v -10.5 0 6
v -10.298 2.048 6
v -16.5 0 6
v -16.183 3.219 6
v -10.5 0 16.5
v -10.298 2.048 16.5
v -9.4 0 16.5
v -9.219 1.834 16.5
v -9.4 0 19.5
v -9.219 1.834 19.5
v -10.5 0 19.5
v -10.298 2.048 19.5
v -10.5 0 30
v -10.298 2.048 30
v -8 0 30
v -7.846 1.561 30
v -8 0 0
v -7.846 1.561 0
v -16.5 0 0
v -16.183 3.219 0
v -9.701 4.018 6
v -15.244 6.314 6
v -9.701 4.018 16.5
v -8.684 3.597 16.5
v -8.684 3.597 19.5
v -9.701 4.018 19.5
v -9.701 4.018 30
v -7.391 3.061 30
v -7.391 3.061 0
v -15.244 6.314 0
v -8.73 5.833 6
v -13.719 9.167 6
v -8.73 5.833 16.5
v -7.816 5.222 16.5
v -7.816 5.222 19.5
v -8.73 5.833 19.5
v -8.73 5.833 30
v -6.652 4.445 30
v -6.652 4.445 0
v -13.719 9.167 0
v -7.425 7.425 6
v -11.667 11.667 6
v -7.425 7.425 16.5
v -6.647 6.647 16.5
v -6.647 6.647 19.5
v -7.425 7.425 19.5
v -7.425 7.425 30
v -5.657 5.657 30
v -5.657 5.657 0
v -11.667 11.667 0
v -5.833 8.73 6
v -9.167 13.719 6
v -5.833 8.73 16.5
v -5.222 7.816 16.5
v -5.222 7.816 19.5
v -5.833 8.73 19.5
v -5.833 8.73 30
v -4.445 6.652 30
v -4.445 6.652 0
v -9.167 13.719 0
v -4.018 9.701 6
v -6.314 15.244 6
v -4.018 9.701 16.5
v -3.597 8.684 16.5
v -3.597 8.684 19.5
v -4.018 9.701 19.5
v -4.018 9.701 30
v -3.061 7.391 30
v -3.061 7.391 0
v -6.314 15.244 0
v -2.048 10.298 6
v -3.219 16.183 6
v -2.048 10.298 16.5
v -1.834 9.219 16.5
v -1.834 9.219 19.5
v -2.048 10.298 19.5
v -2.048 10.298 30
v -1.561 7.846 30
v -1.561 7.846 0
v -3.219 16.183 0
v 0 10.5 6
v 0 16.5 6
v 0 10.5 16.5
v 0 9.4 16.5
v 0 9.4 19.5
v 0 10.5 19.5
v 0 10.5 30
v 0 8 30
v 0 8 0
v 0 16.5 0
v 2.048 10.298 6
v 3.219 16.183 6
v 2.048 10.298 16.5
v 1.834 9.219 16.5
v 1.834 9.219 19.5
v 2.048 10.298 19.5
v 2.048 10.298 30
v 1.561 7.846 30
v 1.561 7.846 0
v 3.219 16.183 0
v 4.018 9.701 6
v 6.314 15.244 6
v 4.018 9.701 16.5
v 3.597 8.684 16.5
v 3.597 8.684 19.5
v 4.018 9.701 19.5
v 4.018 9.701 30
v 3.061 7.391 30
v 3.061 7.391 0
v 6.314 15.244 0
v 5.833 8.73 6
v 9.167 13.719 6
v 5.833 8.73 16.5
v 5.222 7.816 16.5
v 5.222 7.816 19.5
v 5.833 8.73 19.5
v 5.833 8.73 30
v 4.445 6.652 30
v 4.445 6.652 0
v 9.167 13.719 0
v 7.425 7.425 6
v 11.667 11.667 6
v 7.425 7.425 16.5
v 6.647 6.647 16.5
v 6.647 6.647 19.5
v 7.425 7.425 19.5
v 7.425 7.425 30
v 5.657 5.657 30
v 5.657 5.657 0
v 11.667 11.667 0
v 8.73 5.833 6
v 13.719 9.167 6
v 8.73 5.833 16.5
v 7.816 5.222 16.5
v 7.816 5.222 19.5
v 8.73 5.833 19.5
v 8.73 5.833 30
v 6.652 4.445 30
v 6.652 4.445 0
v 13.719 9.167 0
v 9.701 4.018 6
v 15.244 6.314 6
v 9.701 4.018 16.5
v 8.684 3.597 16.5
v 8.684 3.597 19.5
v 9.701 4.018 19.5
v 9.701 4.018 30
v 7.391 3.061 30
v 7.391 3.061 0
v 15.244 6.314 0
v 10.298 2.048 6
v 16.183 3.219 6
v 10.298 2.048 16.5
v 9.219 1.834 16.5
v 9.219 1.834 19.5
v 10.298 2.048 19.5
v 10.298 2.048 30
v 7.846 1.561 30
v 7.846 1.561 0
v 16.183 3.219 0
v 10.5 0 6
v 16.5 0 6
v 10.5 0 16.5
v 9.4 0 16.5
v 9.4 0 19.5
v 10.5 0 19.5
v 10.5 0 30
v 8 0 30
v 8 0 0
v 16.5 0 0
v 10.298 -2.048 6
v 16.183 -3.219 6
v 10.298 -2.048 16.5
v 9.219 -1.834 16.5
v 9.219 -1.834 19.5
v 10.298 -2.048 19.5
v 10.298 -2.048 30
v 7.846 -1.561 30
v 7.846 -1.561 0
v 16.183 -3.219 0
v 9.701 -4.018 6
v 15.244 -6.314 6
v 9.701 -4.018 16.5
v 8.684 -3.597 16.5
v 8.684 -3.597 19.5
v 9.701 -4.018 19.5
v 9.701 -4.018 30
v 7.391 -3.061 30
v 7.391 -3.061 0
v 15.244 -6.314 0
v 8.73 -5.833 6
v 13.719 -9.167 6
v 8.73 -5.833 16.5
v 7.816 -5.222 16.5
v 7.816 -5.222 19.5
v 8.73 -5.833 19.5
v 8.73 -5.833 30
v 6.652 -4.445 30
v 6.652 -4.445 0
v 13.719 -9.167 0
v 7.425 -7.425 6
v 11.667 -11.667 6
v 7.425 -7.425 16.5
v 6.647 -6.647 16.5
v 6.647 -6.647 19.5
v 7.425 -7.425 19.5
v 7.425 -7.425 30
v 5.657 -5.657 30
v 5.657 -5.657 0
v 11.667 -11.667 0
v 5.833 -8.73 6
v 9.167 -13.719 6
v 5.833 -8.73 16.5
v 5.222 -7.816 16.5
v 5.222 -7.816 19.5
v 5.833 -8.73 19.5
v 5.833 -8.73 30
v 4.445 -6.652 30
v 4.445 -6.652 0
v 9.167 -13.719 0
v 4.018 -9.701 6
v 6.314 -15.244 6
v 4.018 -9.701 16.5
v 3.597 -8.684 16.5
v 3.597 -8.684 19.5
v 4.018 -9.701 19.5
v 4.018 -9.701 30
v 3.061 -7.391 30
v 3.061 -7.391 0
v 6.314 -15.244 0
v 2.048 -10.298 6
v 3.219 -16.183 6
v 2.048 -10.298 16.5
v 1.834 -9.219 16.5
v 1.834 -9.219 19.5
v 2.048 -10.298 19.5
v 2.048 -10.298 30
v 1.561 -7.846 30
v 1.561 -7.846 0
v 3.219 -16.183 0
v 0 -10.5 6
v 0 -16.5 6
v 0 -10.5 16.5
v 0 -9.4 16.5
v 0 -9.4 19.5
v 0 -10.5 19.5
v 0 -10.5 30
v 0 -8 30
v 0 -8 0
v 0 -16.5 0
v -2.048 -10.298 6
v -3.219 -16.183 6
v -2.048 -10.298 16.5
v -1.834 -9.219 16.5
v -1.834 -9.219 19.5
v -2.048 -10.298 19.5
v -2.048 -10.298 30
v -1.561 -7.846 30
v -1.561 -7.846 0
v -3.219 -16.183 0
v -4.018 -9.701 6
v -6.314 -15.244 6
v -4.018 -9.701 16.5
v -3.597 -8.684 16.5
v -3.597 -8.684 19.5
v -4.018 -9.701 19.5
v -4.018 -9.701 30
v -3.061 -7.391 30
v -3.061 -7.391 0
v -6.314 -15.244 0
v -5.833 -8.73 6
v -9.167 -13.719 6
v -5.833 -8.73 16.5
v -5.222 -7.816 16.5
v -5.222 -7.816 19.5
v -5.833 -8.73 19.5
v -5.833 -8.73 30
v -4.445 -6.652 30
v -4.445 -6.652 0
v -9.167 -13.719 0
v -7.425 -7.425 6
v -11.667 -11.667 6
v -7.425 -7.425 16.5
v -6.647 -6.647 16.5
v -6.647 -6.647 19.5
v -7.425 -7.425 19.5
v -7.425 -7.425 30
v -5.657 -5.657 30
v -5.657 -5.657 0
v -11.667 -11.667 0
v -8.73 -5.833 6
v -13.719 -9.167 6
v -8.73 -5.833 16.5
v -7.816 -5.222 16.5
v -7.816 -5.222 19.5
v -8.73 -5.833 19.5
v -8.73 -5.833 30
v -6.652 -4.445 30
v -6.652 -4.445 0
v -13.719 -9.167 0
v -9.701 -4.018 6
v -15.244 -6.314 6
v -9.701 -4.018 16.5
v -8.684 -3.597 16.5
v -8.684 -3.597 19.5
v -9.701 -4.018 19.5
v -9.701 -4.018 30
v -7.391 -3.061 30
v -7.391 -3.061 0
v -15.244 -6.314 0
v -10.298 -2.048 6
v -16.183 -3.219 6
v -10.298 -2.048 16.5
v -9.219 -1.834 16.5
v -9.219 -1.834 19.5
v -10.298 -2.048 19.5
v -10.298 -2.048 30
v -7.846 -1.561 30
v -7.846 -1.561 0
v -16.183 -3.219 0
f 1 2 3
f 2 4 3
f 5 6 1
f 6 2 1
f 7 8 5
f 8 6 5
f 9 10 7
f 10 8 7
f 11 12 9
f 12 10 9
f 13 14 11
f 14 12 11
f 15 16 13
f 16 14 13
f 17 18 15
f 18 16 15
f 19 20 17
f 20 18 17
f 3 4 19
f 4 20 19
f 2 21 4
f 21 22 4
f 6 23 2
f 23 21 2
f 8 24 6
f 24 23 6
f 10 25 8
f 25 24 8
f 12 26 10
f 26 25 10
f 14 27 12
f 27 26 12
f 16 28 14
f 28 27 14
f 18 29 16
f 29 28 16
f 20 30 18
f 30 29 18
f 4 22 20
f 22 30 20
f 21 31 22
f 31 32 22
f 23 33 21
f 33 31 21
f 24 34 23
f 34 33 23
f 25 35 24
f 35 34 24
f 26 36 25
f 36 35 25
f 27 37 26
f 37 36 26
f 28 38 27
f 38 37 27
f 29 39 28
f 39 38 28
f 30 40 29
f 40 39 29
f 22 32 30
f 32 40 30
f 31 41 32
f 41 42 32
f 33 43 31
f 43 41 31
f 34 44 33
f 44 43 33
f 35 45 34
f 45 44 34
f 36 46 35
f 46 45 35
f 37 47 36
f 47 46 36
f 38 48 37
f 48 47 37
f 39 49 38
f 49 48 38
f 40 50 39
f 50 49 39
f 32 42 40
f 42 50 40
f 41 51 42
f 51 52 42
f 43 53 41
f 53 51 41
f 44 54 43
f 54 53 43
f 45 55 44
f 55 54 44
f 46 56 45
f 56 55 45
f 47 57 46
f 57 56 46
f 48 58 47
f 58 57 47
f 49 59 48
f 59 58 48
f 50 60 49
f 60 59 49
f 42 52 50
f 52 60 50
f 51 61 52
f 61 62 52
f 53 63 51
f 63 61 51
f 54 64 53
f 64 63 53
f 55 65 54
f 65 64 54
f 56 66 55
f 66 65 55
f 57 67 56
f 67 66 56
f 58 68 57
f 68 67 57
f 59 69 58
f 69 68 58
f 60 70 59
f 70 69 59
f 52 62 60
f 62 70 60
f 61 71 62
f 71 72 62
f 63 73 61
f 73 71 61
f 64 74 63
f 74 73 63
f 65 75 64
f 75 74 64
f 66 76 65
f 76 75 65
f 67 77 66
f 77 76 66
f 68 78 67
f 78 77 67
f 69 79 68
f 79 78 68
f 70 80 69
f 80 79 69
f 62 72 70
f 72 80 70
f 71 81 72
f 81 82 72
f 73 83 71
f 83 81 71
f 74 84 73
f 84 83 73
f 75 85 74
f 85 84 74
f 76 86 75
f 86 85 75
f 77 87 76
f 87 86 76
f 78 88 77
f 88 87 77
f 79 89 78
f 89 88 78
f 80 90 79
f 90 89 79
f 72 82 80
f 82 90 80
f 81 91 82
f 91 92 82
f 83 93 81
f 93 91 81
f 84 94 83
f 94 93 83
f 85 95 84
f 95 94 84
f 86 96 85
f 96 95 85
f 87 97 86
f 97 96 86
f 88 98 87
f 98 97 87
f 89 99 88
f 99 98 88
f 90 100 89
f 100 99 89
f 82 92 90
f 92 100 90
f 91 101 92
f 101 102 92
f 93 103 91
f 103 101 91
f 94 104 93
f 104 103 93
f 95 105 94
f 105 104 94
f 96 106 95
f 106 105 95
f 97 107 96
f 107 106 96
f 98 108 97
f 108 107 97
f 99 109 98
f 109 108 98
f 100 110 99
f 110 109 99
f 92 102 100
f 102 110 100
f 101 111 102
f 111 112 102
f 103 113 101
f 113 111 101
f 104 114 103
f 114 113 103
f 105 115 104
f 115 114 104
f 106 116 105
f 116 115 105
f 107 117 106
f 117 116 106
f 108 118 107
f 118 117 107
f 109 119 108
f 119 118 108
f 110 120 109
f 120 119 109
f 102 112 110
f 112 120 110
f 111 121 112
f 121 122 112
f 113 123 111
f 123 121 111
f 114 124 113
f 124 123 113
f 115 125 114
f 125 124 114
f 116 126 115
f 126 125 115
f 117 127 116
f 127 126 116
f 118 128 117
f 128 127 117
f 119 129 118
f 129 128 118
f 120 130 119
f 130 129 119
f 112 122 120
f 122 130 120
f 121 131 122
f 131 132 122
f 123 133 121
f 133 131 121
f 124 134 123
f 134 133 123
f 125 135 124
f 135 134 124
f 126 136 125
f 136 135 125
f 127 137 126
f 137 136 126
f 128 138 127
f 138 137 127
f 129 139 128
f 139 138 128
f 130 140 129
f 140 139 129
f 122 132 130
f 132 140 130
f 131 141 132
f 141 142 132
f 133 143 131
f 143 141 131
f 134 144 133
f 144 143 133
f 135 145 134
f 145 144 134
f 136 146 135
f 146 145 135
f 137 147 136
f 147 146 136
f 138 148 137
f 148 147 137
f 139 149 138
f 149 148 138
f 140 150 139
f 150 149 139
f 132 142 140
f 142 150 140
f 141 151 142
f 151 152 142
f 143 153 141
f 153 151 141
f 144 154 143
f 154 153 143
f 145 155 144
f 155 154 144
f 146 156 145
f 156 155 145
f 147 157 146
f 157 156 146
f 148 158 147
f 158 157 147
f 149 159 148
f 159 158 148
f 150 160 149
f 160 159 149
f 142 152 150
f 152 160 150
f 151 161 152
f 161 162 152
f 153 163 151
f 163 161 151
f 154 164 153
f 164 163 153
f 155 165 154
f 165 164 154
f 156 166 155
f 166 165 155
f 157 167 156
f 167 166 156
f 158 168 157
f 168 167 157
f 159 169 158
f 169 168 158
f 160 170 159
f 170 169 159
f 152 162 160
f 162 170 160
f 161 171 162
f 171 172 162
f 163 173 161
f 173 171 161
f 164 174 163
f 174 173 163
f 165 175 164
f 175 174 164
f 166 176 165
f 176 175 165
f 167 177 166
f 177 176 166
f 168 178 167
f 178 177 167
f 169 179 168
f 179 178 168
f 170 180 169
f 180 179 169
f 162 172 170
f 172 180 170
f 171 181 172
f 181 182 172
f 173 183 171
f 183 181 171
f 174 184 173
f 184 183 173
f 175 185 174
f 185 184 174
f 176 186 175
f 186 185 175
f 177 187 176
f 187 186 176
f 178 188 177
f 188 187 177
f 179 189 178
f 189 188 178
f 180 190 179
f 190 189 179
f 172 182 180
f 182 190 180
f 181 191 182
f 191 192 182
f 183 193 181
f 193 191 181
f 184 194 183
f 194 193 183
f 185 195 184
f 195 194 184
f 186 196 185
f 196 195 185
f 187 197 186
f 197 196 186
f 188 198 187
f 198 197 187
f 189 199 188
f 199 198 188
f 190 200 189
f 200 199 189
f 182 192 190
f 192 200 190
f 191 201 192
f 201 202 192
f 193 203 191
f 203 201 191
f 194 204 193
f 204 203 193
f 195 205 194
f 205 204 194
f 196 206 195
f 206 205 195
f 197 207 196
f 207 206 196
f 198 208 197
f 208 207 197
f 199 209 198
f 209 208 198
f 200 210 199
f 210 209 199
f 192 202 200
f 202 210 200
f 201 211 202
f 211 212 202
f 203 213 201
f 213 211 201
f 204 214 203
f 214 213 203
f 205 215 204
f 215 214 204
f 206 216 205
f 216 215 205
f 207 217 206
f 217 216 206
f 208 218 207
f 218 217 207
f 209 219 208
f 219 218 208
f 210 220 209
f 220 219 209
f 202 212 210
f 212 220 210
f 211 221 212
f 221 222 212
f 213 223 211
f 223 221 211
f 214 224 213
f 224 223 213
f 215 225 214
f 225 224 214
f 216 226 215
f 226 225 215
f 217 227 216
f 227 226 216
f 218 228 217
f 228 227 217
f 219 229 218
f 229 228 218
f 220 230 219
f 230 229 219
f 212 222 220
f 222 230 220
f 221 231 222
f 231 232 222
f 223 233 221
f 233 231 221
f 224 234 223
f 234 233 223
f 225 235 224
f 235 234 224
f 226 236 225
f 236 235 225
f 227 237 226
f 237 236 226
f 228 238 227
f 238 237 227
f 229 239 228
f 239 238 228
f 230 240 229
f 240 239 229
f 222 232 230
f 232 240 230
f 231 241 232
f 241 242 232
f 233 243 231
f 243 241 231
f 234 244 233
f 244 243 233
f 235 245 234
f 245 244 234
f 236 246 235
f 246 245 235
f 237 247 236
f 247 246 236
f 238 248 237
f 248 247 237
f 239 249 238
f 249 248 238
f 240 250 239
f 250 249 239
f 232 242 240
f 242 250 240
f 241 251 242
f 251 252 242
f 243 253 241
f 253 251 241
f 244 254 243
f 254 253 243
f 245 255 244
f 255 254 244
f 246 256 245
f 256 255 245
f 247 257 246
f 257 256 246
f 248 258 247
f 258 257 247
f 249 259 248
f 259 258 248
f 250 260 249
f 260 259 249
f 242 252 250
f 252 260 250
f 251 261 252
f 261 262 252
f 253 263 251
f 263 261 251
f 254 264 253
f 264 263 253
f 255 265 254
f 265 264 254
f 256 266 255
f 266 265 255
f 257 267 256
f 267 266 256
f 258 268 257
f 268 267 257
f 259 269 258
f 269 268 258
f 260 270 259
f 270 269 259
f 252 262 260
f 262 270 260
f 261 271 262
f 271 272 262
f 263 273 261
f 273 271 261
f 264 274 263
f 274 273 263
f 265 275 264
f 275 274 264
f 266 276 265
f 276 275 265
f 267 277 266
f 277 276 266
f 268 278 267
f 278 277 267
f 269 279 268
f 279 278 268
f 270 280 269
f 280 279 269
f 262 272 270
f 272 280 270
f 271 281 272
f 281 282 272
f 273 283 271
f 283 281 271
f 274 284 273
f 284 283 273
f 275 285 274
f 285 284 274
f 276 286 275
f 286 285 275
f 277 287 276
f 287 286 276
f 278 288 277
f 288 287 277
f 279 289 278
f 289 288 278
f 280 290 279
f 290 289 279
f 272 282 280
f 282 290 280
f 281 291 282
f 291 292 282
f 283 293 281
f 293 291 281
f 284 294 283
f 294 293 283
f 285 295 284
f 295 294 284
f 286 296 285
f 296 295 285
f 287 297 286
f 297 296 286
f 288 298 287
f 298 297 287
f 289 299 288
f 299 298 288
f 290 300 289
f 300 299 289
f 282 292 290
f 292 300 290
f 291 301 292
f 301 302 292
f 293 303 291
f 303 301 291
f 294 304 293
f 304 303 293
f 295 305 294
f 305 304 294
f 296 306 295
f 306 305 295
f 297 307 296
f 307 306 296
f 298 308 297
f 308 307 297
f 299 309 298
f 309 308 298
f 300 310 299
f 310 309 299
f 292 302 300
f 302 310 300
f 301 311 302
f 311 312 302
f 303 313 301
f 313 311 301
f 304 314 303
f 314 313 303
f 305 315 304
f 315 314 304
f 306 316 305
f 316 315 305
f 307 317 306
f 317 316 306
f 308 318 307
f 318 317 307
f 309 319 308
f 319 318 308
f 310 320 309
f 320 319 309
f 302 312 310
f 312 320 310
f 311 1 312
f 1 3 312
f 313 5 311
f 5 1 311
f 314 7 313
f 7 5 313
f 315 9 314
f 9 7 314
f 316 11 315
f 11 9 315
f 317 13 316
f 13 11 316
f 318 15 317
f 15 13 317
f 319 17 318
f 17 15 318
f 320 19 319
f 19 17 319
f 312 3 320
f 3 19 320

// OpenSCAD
$fn = 32;

// ----------------------------------------------------------------------
// Grooved revolve: flanged, bore R8
// ----------------------------------------------------------------------

// --- parameters (mm) ---
bore_r = 8;               // bore radius
outer_r = 10.5;           // outer radius of the body
total_h = 30;             // overall height, Z
wall = 2.5;               // radial wall thickness
groove_w = 3;             // groove width
groove_d = 1.1;           // groove depth
grooves = 1;              // number of outer grooves
flange_r = 16.5;          // flange radius
flange_h = 6;             // flange height

bbox_x = 2 * flange_r;  // full diameter
bore_d = 2 * bore_r;  // bore diameter
body_d = 2 * outer_r;  // body diameter
flange_d = 2 * flange_r;  // flange diameter
revolve_angle = 360;  // full turn around the Z axis

profile = [[8, 0], [10.5, 0], [16.5, 0], [16.5, 6], [10.5, 6], [10.5, 16.5], [9.4, 16.5], [9.4, 19.5], [10.5, 19.5], [10.5, 30], [8, 30]];  // primary outline, 11 points, counter clockwise

// --- the one profile operation ---
rotate_extrude(angle = revolve_angle) polygon(points = profile);
